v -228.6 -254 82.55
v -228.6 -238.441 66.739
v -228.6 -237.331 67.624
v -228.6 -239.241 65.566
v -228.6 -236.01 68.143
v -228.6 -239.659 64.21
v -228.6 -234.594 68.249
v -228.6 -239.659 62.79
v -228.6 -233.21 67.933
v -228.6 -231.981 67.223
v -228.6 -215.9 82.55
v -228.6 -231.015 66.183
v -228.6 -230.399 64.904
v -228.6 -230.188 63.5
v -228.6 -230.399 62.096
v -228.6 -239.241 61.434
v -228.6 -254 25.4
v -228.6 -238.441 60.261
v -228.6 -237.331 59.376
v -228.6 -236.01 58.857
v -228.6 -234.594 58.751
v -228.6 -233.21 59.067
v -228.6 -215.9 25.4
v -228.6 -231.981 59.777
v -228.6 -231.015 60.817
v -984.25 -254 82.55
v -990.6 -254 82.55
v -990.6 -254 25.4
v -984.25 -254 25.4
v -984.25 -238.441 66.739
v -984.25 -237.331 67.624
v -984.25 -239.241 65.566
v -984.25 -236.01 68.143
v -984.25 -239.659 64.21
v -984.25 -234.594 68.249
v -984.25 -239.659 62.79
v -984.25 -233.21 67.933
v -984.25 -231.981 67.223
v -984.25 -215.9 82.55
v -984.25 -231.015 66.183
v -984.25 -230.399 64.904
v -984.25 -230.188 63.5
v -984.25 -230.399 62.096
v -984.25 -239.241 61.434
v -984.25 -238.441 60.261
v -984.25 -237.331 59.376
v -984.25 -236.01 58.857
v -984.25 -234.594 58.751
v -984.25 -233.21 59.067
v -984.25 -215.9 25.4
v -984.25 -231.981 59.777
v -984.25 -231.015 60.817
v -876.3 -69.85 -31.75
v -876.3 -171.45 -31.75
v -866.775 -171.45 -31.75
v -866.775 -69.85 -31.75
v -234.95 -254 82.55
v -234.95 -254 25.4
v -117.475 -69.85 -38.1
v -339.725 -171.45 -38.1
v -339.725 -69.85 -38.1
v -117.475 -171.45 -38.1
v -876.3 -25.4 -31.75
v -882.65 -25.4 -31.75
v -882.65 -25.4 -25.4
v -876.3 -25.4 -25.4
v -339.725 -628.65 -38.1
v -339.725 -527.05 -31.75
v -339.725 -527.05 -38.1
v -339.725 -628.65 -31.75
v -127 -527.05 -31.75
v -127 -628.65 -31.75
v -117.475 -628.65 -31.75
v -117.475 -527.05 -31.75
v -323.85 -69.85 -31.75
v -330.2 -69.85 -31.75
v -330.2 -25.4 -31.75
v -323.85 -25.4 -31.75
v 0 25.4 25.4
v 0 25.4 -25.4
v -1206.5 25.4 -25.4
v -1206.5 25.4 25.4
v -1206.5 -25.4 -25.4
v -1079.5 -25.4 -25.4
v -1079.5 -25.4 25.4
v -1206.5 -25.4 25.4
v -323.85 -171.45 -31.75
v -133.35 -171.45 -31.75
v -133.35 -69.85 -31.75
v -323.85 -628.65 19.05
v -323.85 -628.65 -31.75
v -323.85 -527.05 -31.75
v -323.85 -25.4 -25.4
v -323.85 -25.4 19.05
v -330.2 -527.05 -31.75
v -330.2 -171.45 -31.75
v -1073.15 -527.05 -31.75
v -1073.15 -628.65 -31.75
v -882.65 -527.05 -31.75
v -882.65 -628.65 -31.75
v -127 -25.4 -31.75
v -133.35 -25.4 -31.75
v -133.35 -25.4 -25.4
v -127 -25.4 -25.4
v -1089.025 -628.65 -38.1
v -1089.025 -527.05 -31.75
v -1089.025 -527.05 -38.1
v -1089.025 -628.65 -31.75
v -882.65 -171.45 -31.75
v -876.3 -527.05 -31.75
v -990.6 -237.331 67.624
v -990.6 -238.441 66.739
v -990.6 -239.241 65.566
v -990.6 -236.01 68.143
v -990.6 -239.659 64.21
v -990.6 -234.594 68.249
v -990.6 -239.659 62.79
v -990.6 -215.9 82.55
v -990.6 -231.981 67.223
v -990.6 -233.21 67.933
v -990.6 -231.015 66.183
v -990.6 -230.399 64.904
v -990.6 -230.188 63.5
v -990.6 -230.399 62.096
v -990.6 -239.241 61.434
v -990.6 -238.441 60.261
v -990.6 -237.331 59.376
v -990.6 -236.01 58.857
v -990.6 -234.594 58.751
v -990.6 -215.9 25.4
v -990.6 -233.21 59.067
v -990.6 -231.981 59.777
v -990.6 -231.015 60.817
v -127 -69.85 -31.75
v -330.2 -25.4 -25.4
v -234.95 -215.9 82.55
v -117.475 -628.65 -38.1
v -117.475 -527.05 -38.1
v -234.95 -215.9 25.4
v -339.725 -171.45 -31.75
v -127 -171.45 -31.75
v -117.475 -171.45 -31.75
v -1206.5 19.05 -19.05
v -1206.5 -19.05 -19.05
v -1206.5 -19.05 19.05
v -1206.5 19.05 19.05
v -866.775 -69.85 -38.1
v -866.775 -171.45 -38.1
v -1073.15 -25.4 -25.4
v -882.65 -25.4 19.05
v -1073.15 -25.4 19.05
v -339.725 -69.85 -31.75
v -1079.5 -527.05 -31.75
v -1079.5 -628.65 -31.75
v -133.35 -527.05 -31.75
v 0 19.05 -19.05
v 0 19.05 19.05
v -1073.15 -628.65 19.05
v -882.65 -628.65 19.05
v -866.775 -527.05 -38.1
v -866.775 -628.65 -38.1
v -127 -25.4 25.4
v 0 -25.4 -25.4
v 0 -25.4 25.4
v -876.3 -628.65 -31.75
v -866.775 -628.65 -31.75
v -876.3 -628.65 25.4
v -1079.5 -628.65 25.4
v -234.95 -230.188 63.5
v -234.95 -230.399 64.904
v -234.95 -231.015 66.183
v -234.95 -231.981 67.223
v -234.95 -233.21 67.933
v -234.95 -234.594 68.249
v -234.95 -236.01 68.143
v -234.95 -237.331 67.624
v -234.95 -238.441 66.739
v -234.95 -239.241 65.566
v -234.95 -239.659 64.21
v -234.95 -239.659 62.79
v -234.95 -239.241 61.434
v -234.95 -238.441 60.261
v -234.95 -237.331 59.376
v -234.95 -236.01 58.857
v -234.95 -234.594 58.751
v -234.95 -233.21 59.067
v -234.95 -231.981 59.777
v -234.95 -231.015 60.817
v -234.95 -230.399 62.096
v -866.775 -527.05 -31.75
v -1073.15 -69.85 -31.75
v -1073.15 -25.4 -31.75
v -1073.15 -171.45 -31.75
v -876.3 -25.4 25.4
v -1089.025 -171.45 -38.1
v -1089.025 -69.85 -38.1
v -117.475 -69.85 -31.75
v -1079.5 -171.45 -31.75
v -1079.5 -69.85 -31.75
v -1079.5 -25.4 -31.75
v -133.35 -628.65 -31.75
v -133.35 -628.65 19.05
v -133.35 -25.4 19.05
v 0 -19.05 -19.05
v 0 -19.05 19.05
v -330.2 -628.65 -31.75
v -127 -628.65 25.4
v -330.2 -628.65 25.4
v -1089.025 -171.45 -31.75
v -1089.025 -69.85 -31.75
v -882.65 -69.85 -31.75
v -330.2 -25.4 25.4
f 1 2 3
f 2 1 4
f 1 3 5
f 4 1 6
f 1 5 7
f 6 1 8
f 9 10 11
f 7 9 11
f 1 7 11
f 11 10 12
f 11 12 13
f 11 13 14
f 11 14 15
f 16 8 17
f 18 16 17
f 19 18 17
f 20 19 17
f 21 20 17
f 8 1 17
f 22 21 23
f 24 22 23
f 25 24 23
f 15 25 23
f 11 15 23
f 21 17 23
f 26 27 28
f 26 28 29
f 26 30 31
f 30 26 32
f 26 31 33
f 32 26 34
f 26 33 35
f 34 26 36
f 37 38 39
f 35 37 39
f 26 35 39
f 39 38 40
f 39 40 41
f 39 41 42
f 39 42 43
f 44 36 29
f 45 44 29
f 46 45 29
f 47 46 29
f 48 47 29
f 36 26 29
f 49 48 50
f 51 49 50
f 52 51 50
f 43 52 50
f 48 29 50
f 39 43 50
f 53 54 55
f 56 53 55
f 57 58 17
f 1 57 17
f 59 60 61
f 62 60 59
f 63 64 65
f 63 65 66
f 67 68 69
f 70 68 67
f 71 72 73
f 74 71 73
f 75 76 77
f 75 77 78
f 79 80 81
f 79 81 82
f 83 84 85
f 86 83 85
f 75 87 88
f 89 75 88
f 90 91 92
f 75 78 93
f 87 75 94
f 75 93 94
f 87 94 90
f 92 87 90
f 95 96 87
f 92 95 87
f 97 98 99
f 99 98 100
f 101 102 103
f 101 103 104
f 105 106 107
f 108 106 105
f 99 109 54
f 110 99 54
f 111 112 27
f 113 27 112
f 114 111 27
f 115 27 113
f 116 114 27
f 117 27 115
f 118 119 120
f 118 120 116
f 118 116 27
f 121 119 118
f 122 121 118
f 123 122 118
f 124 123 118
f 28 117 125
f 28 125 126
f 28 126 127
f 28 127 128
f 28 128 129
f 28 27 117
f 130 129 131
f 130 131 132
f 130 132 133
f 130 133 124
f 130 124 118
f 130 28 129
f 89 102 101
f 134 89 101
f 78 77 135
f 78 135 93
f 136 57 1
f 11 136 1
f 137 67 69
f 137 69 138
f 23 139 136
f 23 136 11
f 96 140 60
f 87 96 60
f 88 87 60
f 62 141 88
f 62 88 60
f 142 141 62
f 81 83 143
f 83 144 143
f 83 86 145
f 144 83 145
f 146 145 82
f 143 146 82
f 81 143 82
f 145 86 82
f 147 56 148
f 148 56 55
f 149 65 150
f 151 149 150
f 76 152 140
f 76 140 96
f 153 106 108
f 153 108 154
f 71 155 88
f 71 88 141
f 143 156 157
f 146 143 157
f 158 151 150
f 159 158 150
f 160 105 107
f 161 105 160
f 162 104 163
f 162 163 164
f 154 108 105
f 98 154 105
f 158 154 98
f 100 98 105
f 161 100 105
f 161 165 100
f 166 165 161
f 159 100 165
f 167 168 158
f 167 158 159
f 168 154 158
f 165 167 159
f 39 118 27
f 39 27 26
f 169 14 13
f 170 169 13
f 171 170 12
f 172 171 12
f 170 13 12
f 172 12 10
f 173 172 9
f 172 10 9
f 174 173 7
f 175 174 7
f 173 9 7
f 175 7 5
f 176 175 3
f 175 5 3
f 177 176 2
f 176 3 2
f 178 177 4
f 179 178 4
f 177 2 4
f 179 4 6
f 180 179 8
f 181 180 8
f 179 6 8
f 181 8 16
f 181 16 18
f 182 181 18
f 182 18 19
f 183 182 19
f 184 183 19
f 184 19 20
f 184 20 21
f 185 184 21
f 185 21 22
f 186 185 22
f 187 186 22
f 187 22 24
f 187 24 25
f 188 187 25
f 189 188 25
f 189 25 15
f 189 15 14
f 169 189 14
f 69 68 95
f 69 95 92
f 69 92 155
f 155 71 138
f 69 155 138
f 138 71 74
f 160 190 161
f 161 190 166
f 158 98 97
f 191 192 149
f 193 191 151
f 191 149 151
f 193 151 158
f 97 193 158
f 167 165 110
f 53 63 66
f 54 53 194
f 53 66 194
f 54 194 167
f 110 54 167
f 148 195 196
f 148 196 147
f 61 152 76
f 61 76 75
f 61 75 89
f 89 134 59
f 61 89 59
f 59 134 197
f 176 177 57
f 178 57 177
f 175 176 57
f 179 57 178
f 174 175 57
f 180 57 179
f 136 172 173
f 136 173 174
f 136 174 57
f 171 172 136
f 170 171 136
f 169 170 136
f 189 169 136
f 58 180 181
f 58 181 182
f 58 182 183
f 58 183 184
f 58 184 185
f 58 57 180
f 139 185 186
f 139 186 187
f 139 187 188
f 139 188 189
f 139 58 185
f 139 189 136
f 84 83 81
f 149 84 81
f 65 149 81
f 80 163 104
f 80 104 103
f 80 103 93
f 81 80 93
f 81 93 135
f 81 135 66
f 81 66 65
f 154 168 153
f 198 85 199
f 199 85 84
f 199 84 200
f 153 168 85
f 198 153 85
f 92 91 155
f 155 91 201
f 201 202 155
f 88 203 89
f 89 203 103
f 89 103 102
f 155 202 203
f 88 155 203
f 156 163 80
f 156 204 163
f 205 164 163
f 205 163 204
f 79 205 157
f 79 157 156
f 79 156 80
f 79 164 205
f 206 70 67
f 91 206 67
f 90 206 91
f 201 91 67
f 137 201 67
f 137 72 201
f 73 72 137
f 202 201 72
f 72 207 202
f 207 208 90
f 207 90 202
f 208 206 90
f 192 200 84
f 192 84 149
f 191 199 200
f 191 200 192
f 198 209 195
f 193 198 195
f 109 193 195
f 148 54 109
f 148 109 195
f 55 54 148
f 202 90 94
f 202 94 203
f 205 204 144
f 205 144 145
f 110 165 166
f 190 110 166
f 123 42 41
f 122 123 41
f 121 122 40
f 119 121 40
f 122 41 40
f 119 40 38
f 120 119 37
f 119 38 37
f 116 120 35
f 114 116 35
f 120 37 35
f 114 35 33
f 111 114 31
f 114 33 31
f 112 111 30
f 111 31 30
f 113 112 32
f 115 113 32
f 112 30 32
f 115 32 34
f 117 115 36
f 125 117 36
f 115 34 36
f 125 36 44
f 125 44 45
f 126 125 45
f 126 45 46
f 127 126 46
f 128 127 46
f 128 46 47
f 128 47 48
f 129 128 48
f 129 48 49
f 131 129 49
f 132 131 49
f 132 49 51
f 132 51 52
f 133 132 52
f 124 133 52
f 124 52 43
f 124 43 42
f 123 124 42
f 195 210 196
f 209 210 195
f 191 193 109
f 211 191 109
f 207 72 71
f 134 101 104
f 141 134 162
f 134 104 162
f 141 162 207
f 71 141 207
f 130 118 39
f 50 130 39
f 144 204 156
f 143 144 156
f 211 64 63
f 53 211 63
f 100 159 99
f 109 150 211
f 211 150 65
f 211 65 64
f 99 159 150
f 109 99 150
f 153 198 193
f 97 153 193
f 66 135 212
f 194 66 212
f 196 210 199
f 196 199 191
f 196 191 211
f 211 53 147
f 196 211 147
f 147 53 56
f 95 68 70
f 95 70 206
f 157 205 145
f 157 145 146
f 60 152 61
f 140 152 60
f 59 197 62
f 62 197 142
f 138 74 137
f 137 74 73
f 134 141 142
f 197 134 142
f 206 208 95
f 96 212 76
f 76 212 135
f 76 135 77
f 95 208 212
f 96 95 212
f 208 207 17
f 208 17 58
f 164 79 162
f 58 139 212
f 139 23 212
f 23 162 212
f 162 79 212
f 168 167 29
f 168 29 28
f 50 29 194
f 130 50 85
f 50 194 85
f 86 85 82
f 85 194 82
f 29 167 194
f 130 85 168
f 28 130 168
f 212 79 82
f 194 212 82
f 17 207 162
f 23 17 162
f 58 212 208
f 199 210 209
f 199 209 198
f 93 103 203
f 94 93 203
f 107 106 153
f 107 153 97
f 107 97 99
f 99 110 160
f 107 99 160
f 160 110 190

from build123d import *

# Parameters (mm, degrees)
F0_W      = 50.8
F0_H      = 50.8
F0_W_2    = 38.1
F0_H_2    = 38.1
F1_DEPTH  = 1206.5
F4_DEPTH  = 603.25
F5_W      = 222.25
F5_H      = 101.6
F6_DEPTH  = 6.35
F7_W      = 6.35
F7_H      = 38.1
F8_DEPTH  = 57.15
F9_R      = 4.7625
F10_DEPTH = 762


with BuildPart() as f1:
    # F0 (on Right) → F1 (new body)
    with BuildSketch(Plane.YZ):
        Rectangle(F0_W, F0_H)
        Rectangle(F0_W_2, F0_H_2, mode=Mode.SUBTRACT)
    extrude(amount=-F1_DEPTH)

    # F3 (on offset) → F4 (join)
    with BuildSketch(Plane.XZ.offset(25.4)):
        Polygon((-876.3, 25.4), (-1079.5, 25.4), (-1079.5, -31.75), (-1073.15, -31.75), (-1073.15, 19.05), (-882.65, 19.05), (-882.65, -31.75), (-876.3, -31.75), align=None)
        Polygon((-127, -31.75), (-127, 25.4), (-330.2, 25.4), (-330.2, -31.75), (-323.85, -31.75), (-323.85, 19.05), (-133.35, 19.05), (-133.35, -31.75), align=None)
    extrude(amount=F4_DEPTH)

    # F5 (on face) → F6 (join)
    with BuildSketch(Plane(origin=(0, 0, -31.75), x_dir=(1, 0, 0), z_dir=(0, 0, -1))):
        with Locations((-228.6, 120.65)):
            Rectangle(F5_W, F5_H)
        with Locations((-228.6, 577.85)):
            Rectangle(F5_W, F5_H)
        with Locations((-977.9, 120.65)):
            Rectangle(F5_W, F5_H)
        with Locations((-977.9, 577.85)):
            Rectangle(F5_W, F5_H)
    extrude(amount=F6_DEPTH)

    # F7 (on face) → F8 (join)
    with BuildSketch(Plane.XY.offset(25.4)):
        with Locations((-231.775, -234.95)):
            Rectangle(F7_W, F7_H)
        with Locations((-987.425, -234.95)):
            Rectangle(F7_W, F7_H)
    extrude(amount=F8_DEPTH)

    # F9 (on face) → F10 (cut)
    with BuildSketch(Plane.YZ.offset(-228.6)):
        with Locations((-234.95, 63.5)):
            Circle(F9_R)
    extrude(amount=-F10_DEPTH, mode=Mode.SUBTRACT)


solid = f1.part
